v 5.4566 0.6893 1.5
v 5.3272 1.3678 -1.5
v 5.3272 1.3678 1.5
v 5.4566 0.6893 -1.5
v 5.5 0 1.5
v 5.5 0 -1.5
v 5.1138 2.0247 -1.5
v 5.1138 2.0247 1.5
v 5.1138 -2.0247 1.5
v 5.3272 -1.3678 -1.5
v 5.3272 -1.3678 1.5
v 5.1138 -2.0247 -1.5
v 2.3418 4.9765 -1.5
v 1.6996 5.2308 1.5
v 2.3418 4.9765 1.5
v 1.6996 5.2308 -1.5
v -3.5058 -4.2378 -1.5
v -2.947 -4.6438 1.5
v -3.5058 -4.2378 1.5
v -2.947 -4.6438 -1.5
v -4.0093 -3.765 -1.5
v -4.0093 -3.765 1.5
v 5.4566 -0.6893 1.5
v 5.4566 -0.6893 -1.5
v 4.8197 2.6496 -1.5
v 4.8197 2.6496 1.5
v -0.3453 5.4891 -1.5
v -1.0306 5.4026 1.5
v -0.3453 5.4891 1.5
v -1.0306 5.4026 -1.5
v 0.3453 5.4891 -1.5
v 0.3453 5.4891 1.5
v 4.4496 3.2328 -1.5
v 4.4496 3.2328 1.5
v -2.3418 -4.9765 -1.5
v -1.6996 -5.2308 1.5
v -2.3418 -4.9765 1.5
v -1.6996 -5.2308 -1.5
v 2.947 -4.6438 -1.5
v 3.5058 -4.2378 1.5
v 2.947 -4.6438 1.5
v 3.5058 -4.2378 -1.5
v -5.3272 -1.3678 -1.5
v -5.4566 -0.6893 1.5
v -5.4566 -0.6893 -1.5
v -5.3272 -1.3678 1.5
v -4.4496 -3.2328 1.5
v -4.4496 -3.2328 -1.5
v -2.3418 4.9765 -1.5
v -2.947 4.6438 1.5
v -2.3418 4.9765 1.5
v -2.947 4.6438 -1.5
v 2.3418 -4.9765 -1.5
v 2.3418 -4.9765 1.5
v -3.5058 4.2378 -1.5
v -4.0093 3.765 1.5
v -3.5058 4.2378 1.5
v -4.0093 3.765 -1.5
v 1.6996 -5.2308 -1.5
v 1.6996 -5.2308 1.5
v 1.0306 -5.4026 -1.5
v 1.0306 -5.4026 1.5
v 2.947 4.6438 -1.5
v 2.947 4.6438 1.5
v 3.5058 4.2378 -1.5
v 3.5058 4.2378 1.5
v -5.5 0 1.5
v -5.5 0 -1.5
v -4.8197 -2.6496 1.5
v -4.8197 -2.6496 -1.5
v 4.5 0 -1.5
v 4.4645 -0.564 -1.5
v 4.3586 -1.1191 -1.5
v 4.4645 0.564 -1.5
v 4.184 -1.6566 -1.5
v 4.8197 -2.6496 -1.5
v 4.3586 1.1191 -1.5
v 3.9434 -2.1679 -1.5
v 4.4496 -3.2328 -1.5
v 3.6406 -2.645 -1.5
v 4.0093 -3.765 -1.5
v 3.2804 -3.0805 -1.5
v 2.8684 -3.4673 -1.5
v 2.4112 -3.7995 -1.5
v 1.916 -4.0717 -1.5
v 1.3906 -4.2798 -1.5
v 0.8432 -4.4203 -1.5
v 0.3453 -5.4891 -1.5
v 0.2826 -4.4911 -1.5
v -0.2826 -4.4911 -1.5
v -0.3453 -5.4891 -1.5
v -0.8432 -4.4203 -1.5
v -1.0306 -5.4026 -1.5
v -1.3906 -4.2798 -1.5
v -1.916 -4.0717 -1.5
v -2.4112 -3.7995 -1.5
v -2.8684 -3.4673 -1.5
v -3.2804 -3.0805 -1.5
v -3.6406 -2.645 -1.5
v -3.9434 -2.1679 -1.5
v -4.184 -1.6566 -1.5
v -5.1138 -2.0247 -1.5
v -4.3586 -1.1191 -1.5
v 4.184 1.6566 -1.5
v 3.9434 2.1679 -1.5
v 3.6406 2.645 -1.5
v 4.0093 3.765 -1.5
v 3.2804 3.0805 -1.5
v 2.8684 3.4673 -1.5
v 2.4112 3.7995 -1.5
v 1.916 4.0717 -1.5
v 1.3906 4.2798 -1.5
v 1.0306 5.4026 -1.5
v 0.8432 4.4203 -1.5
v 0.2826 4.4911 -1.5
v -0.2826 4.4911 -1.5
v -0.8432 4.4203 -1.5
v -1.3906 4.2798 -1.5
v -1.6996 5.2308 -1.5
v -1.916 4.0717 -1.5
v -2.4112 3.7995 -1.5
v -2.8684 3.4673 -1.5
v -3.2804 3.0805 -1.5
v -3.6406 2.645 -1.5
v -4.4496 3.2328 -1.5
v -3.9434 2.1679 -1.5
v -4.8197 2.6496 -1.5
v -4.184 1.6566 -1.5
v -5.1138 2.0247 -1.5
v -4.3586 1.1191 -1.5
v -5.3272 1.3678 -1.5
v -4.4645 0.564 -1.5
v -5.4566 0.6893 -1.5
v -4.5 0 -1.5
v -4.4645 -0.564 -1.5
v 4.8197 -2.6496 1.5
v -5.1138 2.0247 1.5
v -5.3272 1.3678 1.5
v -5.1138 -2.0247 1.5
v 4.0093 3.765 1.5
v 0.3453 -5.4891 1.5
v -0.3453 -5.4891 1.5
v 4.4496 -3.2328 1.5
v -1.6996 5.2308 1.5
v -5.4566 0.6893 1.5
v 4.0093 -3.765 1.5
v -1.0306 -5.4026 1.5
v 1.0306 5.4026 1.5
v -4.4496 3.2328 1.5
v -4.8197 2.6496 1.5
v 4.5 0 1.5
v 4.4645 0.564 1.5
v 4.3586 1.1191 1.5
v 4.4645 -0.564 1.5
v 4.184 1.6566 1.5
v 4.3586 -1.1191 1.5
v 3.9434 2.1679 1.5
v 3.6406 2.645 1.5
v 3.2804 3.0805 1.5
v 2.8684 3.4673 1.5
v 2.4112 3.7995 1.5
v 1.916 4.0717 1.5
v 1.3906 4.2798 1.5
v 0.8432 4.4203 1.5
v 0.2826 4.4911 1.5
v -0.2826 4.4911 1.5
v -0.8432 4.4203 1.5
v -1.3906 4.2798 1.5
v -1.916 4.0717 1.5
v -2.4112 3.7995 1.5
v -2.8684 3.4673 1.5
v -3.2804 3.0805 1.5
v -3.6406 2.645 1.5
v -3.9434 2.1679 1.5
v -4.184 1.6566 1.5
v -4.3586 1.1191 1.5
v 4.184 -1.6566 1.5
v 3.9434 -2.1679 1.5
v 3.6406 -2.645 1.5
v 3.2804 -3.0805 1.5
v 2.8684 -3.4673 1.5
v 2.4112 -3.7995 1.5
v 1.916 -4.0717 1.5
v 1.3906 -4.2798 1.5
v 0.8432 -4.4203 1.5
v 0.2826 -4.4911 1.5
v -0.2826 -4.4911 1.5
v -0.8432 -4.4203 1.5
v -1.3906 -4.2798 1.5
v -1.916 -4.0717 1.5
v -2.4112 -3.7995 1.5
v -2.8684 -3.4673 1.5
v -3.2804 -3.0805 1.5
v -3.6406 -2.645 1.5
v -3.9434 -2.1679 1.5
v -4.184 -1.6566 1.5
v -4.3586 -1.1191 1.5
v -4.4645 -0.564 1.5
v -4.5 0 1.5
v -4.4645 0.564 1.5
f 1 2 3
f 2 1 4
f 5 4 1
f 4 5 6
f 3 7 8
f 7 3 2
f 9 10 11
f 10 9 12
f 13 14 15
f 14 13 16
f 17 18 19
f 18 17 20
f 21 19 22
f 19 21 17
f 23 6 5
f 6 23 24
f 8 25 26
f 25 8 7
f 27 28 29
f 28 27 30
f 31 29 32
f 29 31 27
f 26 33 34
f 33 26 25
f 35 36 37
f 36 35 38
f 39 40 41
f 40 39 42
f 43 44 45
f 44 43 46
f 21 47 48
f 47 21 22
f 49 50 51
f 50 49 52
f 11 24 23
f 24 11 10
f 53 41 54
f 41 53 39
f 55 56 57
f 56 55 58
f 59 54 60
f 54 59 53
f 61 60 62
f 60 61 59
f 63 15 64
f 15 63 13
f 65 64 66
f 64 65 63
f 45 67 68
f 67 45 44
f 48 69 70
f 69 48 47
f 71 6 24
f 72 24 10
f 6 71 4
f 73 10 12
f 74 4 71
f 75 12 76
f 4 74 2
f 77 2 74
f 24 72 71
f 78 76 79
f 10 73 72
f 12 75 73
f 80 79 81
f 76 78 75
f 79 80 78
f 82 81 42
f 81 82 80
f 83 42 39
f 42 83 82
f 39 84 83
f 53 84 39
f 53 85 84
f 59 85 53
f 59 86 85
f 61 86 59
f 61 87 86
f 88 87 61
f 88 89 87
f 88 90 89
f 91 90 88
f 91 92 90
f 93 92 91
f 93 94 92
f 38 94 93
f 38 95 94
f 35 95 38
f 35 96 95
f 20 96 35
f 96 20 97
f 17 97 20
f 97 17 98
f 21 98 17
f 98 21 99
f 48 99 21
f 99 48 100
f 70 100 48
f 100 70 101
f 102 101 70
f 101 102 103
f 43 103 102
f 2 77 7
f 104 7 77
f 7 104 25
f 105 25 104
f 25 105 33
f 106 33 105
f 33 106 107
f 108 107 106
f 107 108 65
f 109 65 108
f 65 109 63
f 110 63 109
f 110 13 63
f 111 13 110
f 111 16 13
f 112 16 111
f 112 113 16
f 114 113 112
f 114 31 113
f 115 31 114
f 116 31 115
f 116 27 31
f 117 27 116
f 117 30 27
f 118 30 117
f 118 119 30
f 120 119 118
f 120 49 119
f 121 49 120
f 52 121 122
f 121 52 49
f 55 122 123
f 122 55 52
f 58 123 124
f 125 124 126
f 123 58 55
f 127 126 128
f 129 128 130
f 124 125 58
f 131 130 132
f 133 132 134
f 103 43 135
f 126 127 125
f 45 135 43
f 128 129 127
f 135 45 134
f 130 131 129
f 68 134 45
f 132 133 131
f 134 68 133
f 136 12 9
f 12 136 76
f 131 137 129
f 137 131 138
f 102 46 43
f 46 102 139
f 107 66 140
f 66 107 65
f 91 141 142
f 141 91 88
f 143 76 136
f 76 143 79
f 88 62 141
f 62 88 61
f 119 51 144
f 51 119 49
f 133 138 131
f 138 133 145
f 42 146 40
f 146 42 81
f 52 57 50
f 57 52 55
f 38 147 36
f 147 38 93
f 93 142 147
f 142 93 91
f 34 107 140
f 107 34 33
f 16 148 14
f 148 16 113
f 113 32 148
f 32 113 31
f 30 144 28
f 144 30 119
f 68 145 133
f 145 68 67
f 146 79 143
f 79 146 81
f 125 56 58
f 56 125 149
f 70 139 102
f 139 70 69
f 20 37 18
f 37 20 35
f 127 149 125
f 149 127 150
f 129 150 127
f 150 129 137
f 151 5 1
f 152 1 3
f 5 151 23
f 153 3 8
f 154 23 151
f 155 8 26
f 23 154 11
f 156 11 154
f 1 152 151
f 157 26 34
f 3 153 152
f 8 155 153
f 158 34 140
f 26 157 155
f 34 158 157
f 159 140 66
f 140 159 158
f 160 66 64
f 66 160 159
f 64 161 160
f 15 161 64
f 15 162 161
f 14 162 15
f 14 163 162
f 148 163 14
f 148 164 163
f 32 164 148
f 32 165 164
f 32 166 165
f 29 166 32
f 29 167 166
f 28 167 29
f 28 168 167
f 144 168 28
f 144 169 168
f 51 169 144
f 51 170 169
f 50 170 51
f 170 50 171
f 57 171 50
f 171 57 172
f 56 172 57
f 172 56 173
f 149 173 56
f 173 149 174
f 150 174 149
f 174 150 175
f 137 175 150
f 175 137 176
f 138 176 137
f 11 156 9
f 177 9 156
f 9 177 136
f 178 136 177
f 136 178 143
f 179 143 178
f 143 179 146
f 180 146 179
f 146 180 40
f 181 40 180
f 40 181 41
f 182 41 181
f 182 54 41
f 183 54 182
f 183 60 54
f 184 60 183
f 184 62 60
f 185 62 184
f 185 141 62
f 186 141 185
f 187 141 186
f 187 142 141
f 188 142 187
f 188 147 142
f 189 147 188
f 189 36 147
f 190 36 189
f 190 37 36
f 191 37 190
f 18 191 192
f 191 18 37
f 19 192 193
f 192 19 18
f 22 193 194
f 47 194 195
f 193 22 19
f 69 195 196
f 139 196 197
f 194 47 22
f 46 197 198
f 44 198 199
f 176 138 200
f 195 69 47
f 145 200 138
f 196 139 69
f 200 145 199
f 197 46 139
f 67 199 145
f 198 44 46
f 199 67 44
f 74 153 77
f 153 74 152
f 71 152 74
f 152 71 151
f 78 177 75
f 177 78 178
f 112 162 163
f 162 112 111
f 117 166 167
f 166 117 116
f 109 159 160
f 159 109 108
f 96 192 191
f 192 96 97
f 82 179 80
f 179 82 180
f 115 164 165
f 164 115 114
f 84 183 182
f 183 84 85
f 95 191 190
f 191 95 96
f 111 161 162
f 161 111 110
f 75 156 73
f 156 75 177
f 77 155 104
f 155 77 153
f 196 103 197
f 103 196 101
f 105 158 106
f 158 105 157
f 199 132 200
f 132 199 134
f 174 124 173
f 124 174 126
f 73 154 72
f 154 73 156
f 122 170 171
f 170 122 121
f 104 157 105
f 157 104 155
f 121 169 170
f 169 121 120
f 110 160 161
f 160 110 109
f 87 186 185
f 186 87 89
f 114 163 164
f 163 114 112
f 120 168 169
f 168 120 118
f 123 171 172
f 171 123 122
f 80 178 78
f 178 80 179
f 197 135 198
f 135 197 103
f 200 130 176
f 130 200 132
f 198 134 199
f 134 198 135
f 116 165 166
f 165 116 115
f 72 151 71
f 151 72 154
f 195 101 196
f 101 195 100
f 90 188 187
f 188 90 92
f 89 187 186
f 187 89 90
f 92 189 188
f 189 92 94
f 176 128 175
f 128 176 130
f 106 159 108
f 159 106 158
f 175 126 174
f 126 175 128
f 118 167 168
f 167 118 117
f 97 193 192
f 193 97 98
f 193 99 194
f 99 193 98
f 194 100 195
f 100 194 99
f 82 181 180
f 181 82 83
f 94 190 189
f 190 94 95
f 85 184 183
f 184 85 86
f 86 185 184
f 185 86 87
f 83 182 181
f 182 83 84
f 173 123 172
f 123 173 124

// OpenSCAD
$fn = 50;


difference() {
	union() {
		translate(v = [0, 0, -1.5000000000]) {
			cylinder(h = 3, r = 5.5000000000);
		}
	}
	union() {
		translate(v = [0, 0, -100.0000000000]) {
			cylinder(h = 200, r = 4.5000000000);
		}
	}
}
